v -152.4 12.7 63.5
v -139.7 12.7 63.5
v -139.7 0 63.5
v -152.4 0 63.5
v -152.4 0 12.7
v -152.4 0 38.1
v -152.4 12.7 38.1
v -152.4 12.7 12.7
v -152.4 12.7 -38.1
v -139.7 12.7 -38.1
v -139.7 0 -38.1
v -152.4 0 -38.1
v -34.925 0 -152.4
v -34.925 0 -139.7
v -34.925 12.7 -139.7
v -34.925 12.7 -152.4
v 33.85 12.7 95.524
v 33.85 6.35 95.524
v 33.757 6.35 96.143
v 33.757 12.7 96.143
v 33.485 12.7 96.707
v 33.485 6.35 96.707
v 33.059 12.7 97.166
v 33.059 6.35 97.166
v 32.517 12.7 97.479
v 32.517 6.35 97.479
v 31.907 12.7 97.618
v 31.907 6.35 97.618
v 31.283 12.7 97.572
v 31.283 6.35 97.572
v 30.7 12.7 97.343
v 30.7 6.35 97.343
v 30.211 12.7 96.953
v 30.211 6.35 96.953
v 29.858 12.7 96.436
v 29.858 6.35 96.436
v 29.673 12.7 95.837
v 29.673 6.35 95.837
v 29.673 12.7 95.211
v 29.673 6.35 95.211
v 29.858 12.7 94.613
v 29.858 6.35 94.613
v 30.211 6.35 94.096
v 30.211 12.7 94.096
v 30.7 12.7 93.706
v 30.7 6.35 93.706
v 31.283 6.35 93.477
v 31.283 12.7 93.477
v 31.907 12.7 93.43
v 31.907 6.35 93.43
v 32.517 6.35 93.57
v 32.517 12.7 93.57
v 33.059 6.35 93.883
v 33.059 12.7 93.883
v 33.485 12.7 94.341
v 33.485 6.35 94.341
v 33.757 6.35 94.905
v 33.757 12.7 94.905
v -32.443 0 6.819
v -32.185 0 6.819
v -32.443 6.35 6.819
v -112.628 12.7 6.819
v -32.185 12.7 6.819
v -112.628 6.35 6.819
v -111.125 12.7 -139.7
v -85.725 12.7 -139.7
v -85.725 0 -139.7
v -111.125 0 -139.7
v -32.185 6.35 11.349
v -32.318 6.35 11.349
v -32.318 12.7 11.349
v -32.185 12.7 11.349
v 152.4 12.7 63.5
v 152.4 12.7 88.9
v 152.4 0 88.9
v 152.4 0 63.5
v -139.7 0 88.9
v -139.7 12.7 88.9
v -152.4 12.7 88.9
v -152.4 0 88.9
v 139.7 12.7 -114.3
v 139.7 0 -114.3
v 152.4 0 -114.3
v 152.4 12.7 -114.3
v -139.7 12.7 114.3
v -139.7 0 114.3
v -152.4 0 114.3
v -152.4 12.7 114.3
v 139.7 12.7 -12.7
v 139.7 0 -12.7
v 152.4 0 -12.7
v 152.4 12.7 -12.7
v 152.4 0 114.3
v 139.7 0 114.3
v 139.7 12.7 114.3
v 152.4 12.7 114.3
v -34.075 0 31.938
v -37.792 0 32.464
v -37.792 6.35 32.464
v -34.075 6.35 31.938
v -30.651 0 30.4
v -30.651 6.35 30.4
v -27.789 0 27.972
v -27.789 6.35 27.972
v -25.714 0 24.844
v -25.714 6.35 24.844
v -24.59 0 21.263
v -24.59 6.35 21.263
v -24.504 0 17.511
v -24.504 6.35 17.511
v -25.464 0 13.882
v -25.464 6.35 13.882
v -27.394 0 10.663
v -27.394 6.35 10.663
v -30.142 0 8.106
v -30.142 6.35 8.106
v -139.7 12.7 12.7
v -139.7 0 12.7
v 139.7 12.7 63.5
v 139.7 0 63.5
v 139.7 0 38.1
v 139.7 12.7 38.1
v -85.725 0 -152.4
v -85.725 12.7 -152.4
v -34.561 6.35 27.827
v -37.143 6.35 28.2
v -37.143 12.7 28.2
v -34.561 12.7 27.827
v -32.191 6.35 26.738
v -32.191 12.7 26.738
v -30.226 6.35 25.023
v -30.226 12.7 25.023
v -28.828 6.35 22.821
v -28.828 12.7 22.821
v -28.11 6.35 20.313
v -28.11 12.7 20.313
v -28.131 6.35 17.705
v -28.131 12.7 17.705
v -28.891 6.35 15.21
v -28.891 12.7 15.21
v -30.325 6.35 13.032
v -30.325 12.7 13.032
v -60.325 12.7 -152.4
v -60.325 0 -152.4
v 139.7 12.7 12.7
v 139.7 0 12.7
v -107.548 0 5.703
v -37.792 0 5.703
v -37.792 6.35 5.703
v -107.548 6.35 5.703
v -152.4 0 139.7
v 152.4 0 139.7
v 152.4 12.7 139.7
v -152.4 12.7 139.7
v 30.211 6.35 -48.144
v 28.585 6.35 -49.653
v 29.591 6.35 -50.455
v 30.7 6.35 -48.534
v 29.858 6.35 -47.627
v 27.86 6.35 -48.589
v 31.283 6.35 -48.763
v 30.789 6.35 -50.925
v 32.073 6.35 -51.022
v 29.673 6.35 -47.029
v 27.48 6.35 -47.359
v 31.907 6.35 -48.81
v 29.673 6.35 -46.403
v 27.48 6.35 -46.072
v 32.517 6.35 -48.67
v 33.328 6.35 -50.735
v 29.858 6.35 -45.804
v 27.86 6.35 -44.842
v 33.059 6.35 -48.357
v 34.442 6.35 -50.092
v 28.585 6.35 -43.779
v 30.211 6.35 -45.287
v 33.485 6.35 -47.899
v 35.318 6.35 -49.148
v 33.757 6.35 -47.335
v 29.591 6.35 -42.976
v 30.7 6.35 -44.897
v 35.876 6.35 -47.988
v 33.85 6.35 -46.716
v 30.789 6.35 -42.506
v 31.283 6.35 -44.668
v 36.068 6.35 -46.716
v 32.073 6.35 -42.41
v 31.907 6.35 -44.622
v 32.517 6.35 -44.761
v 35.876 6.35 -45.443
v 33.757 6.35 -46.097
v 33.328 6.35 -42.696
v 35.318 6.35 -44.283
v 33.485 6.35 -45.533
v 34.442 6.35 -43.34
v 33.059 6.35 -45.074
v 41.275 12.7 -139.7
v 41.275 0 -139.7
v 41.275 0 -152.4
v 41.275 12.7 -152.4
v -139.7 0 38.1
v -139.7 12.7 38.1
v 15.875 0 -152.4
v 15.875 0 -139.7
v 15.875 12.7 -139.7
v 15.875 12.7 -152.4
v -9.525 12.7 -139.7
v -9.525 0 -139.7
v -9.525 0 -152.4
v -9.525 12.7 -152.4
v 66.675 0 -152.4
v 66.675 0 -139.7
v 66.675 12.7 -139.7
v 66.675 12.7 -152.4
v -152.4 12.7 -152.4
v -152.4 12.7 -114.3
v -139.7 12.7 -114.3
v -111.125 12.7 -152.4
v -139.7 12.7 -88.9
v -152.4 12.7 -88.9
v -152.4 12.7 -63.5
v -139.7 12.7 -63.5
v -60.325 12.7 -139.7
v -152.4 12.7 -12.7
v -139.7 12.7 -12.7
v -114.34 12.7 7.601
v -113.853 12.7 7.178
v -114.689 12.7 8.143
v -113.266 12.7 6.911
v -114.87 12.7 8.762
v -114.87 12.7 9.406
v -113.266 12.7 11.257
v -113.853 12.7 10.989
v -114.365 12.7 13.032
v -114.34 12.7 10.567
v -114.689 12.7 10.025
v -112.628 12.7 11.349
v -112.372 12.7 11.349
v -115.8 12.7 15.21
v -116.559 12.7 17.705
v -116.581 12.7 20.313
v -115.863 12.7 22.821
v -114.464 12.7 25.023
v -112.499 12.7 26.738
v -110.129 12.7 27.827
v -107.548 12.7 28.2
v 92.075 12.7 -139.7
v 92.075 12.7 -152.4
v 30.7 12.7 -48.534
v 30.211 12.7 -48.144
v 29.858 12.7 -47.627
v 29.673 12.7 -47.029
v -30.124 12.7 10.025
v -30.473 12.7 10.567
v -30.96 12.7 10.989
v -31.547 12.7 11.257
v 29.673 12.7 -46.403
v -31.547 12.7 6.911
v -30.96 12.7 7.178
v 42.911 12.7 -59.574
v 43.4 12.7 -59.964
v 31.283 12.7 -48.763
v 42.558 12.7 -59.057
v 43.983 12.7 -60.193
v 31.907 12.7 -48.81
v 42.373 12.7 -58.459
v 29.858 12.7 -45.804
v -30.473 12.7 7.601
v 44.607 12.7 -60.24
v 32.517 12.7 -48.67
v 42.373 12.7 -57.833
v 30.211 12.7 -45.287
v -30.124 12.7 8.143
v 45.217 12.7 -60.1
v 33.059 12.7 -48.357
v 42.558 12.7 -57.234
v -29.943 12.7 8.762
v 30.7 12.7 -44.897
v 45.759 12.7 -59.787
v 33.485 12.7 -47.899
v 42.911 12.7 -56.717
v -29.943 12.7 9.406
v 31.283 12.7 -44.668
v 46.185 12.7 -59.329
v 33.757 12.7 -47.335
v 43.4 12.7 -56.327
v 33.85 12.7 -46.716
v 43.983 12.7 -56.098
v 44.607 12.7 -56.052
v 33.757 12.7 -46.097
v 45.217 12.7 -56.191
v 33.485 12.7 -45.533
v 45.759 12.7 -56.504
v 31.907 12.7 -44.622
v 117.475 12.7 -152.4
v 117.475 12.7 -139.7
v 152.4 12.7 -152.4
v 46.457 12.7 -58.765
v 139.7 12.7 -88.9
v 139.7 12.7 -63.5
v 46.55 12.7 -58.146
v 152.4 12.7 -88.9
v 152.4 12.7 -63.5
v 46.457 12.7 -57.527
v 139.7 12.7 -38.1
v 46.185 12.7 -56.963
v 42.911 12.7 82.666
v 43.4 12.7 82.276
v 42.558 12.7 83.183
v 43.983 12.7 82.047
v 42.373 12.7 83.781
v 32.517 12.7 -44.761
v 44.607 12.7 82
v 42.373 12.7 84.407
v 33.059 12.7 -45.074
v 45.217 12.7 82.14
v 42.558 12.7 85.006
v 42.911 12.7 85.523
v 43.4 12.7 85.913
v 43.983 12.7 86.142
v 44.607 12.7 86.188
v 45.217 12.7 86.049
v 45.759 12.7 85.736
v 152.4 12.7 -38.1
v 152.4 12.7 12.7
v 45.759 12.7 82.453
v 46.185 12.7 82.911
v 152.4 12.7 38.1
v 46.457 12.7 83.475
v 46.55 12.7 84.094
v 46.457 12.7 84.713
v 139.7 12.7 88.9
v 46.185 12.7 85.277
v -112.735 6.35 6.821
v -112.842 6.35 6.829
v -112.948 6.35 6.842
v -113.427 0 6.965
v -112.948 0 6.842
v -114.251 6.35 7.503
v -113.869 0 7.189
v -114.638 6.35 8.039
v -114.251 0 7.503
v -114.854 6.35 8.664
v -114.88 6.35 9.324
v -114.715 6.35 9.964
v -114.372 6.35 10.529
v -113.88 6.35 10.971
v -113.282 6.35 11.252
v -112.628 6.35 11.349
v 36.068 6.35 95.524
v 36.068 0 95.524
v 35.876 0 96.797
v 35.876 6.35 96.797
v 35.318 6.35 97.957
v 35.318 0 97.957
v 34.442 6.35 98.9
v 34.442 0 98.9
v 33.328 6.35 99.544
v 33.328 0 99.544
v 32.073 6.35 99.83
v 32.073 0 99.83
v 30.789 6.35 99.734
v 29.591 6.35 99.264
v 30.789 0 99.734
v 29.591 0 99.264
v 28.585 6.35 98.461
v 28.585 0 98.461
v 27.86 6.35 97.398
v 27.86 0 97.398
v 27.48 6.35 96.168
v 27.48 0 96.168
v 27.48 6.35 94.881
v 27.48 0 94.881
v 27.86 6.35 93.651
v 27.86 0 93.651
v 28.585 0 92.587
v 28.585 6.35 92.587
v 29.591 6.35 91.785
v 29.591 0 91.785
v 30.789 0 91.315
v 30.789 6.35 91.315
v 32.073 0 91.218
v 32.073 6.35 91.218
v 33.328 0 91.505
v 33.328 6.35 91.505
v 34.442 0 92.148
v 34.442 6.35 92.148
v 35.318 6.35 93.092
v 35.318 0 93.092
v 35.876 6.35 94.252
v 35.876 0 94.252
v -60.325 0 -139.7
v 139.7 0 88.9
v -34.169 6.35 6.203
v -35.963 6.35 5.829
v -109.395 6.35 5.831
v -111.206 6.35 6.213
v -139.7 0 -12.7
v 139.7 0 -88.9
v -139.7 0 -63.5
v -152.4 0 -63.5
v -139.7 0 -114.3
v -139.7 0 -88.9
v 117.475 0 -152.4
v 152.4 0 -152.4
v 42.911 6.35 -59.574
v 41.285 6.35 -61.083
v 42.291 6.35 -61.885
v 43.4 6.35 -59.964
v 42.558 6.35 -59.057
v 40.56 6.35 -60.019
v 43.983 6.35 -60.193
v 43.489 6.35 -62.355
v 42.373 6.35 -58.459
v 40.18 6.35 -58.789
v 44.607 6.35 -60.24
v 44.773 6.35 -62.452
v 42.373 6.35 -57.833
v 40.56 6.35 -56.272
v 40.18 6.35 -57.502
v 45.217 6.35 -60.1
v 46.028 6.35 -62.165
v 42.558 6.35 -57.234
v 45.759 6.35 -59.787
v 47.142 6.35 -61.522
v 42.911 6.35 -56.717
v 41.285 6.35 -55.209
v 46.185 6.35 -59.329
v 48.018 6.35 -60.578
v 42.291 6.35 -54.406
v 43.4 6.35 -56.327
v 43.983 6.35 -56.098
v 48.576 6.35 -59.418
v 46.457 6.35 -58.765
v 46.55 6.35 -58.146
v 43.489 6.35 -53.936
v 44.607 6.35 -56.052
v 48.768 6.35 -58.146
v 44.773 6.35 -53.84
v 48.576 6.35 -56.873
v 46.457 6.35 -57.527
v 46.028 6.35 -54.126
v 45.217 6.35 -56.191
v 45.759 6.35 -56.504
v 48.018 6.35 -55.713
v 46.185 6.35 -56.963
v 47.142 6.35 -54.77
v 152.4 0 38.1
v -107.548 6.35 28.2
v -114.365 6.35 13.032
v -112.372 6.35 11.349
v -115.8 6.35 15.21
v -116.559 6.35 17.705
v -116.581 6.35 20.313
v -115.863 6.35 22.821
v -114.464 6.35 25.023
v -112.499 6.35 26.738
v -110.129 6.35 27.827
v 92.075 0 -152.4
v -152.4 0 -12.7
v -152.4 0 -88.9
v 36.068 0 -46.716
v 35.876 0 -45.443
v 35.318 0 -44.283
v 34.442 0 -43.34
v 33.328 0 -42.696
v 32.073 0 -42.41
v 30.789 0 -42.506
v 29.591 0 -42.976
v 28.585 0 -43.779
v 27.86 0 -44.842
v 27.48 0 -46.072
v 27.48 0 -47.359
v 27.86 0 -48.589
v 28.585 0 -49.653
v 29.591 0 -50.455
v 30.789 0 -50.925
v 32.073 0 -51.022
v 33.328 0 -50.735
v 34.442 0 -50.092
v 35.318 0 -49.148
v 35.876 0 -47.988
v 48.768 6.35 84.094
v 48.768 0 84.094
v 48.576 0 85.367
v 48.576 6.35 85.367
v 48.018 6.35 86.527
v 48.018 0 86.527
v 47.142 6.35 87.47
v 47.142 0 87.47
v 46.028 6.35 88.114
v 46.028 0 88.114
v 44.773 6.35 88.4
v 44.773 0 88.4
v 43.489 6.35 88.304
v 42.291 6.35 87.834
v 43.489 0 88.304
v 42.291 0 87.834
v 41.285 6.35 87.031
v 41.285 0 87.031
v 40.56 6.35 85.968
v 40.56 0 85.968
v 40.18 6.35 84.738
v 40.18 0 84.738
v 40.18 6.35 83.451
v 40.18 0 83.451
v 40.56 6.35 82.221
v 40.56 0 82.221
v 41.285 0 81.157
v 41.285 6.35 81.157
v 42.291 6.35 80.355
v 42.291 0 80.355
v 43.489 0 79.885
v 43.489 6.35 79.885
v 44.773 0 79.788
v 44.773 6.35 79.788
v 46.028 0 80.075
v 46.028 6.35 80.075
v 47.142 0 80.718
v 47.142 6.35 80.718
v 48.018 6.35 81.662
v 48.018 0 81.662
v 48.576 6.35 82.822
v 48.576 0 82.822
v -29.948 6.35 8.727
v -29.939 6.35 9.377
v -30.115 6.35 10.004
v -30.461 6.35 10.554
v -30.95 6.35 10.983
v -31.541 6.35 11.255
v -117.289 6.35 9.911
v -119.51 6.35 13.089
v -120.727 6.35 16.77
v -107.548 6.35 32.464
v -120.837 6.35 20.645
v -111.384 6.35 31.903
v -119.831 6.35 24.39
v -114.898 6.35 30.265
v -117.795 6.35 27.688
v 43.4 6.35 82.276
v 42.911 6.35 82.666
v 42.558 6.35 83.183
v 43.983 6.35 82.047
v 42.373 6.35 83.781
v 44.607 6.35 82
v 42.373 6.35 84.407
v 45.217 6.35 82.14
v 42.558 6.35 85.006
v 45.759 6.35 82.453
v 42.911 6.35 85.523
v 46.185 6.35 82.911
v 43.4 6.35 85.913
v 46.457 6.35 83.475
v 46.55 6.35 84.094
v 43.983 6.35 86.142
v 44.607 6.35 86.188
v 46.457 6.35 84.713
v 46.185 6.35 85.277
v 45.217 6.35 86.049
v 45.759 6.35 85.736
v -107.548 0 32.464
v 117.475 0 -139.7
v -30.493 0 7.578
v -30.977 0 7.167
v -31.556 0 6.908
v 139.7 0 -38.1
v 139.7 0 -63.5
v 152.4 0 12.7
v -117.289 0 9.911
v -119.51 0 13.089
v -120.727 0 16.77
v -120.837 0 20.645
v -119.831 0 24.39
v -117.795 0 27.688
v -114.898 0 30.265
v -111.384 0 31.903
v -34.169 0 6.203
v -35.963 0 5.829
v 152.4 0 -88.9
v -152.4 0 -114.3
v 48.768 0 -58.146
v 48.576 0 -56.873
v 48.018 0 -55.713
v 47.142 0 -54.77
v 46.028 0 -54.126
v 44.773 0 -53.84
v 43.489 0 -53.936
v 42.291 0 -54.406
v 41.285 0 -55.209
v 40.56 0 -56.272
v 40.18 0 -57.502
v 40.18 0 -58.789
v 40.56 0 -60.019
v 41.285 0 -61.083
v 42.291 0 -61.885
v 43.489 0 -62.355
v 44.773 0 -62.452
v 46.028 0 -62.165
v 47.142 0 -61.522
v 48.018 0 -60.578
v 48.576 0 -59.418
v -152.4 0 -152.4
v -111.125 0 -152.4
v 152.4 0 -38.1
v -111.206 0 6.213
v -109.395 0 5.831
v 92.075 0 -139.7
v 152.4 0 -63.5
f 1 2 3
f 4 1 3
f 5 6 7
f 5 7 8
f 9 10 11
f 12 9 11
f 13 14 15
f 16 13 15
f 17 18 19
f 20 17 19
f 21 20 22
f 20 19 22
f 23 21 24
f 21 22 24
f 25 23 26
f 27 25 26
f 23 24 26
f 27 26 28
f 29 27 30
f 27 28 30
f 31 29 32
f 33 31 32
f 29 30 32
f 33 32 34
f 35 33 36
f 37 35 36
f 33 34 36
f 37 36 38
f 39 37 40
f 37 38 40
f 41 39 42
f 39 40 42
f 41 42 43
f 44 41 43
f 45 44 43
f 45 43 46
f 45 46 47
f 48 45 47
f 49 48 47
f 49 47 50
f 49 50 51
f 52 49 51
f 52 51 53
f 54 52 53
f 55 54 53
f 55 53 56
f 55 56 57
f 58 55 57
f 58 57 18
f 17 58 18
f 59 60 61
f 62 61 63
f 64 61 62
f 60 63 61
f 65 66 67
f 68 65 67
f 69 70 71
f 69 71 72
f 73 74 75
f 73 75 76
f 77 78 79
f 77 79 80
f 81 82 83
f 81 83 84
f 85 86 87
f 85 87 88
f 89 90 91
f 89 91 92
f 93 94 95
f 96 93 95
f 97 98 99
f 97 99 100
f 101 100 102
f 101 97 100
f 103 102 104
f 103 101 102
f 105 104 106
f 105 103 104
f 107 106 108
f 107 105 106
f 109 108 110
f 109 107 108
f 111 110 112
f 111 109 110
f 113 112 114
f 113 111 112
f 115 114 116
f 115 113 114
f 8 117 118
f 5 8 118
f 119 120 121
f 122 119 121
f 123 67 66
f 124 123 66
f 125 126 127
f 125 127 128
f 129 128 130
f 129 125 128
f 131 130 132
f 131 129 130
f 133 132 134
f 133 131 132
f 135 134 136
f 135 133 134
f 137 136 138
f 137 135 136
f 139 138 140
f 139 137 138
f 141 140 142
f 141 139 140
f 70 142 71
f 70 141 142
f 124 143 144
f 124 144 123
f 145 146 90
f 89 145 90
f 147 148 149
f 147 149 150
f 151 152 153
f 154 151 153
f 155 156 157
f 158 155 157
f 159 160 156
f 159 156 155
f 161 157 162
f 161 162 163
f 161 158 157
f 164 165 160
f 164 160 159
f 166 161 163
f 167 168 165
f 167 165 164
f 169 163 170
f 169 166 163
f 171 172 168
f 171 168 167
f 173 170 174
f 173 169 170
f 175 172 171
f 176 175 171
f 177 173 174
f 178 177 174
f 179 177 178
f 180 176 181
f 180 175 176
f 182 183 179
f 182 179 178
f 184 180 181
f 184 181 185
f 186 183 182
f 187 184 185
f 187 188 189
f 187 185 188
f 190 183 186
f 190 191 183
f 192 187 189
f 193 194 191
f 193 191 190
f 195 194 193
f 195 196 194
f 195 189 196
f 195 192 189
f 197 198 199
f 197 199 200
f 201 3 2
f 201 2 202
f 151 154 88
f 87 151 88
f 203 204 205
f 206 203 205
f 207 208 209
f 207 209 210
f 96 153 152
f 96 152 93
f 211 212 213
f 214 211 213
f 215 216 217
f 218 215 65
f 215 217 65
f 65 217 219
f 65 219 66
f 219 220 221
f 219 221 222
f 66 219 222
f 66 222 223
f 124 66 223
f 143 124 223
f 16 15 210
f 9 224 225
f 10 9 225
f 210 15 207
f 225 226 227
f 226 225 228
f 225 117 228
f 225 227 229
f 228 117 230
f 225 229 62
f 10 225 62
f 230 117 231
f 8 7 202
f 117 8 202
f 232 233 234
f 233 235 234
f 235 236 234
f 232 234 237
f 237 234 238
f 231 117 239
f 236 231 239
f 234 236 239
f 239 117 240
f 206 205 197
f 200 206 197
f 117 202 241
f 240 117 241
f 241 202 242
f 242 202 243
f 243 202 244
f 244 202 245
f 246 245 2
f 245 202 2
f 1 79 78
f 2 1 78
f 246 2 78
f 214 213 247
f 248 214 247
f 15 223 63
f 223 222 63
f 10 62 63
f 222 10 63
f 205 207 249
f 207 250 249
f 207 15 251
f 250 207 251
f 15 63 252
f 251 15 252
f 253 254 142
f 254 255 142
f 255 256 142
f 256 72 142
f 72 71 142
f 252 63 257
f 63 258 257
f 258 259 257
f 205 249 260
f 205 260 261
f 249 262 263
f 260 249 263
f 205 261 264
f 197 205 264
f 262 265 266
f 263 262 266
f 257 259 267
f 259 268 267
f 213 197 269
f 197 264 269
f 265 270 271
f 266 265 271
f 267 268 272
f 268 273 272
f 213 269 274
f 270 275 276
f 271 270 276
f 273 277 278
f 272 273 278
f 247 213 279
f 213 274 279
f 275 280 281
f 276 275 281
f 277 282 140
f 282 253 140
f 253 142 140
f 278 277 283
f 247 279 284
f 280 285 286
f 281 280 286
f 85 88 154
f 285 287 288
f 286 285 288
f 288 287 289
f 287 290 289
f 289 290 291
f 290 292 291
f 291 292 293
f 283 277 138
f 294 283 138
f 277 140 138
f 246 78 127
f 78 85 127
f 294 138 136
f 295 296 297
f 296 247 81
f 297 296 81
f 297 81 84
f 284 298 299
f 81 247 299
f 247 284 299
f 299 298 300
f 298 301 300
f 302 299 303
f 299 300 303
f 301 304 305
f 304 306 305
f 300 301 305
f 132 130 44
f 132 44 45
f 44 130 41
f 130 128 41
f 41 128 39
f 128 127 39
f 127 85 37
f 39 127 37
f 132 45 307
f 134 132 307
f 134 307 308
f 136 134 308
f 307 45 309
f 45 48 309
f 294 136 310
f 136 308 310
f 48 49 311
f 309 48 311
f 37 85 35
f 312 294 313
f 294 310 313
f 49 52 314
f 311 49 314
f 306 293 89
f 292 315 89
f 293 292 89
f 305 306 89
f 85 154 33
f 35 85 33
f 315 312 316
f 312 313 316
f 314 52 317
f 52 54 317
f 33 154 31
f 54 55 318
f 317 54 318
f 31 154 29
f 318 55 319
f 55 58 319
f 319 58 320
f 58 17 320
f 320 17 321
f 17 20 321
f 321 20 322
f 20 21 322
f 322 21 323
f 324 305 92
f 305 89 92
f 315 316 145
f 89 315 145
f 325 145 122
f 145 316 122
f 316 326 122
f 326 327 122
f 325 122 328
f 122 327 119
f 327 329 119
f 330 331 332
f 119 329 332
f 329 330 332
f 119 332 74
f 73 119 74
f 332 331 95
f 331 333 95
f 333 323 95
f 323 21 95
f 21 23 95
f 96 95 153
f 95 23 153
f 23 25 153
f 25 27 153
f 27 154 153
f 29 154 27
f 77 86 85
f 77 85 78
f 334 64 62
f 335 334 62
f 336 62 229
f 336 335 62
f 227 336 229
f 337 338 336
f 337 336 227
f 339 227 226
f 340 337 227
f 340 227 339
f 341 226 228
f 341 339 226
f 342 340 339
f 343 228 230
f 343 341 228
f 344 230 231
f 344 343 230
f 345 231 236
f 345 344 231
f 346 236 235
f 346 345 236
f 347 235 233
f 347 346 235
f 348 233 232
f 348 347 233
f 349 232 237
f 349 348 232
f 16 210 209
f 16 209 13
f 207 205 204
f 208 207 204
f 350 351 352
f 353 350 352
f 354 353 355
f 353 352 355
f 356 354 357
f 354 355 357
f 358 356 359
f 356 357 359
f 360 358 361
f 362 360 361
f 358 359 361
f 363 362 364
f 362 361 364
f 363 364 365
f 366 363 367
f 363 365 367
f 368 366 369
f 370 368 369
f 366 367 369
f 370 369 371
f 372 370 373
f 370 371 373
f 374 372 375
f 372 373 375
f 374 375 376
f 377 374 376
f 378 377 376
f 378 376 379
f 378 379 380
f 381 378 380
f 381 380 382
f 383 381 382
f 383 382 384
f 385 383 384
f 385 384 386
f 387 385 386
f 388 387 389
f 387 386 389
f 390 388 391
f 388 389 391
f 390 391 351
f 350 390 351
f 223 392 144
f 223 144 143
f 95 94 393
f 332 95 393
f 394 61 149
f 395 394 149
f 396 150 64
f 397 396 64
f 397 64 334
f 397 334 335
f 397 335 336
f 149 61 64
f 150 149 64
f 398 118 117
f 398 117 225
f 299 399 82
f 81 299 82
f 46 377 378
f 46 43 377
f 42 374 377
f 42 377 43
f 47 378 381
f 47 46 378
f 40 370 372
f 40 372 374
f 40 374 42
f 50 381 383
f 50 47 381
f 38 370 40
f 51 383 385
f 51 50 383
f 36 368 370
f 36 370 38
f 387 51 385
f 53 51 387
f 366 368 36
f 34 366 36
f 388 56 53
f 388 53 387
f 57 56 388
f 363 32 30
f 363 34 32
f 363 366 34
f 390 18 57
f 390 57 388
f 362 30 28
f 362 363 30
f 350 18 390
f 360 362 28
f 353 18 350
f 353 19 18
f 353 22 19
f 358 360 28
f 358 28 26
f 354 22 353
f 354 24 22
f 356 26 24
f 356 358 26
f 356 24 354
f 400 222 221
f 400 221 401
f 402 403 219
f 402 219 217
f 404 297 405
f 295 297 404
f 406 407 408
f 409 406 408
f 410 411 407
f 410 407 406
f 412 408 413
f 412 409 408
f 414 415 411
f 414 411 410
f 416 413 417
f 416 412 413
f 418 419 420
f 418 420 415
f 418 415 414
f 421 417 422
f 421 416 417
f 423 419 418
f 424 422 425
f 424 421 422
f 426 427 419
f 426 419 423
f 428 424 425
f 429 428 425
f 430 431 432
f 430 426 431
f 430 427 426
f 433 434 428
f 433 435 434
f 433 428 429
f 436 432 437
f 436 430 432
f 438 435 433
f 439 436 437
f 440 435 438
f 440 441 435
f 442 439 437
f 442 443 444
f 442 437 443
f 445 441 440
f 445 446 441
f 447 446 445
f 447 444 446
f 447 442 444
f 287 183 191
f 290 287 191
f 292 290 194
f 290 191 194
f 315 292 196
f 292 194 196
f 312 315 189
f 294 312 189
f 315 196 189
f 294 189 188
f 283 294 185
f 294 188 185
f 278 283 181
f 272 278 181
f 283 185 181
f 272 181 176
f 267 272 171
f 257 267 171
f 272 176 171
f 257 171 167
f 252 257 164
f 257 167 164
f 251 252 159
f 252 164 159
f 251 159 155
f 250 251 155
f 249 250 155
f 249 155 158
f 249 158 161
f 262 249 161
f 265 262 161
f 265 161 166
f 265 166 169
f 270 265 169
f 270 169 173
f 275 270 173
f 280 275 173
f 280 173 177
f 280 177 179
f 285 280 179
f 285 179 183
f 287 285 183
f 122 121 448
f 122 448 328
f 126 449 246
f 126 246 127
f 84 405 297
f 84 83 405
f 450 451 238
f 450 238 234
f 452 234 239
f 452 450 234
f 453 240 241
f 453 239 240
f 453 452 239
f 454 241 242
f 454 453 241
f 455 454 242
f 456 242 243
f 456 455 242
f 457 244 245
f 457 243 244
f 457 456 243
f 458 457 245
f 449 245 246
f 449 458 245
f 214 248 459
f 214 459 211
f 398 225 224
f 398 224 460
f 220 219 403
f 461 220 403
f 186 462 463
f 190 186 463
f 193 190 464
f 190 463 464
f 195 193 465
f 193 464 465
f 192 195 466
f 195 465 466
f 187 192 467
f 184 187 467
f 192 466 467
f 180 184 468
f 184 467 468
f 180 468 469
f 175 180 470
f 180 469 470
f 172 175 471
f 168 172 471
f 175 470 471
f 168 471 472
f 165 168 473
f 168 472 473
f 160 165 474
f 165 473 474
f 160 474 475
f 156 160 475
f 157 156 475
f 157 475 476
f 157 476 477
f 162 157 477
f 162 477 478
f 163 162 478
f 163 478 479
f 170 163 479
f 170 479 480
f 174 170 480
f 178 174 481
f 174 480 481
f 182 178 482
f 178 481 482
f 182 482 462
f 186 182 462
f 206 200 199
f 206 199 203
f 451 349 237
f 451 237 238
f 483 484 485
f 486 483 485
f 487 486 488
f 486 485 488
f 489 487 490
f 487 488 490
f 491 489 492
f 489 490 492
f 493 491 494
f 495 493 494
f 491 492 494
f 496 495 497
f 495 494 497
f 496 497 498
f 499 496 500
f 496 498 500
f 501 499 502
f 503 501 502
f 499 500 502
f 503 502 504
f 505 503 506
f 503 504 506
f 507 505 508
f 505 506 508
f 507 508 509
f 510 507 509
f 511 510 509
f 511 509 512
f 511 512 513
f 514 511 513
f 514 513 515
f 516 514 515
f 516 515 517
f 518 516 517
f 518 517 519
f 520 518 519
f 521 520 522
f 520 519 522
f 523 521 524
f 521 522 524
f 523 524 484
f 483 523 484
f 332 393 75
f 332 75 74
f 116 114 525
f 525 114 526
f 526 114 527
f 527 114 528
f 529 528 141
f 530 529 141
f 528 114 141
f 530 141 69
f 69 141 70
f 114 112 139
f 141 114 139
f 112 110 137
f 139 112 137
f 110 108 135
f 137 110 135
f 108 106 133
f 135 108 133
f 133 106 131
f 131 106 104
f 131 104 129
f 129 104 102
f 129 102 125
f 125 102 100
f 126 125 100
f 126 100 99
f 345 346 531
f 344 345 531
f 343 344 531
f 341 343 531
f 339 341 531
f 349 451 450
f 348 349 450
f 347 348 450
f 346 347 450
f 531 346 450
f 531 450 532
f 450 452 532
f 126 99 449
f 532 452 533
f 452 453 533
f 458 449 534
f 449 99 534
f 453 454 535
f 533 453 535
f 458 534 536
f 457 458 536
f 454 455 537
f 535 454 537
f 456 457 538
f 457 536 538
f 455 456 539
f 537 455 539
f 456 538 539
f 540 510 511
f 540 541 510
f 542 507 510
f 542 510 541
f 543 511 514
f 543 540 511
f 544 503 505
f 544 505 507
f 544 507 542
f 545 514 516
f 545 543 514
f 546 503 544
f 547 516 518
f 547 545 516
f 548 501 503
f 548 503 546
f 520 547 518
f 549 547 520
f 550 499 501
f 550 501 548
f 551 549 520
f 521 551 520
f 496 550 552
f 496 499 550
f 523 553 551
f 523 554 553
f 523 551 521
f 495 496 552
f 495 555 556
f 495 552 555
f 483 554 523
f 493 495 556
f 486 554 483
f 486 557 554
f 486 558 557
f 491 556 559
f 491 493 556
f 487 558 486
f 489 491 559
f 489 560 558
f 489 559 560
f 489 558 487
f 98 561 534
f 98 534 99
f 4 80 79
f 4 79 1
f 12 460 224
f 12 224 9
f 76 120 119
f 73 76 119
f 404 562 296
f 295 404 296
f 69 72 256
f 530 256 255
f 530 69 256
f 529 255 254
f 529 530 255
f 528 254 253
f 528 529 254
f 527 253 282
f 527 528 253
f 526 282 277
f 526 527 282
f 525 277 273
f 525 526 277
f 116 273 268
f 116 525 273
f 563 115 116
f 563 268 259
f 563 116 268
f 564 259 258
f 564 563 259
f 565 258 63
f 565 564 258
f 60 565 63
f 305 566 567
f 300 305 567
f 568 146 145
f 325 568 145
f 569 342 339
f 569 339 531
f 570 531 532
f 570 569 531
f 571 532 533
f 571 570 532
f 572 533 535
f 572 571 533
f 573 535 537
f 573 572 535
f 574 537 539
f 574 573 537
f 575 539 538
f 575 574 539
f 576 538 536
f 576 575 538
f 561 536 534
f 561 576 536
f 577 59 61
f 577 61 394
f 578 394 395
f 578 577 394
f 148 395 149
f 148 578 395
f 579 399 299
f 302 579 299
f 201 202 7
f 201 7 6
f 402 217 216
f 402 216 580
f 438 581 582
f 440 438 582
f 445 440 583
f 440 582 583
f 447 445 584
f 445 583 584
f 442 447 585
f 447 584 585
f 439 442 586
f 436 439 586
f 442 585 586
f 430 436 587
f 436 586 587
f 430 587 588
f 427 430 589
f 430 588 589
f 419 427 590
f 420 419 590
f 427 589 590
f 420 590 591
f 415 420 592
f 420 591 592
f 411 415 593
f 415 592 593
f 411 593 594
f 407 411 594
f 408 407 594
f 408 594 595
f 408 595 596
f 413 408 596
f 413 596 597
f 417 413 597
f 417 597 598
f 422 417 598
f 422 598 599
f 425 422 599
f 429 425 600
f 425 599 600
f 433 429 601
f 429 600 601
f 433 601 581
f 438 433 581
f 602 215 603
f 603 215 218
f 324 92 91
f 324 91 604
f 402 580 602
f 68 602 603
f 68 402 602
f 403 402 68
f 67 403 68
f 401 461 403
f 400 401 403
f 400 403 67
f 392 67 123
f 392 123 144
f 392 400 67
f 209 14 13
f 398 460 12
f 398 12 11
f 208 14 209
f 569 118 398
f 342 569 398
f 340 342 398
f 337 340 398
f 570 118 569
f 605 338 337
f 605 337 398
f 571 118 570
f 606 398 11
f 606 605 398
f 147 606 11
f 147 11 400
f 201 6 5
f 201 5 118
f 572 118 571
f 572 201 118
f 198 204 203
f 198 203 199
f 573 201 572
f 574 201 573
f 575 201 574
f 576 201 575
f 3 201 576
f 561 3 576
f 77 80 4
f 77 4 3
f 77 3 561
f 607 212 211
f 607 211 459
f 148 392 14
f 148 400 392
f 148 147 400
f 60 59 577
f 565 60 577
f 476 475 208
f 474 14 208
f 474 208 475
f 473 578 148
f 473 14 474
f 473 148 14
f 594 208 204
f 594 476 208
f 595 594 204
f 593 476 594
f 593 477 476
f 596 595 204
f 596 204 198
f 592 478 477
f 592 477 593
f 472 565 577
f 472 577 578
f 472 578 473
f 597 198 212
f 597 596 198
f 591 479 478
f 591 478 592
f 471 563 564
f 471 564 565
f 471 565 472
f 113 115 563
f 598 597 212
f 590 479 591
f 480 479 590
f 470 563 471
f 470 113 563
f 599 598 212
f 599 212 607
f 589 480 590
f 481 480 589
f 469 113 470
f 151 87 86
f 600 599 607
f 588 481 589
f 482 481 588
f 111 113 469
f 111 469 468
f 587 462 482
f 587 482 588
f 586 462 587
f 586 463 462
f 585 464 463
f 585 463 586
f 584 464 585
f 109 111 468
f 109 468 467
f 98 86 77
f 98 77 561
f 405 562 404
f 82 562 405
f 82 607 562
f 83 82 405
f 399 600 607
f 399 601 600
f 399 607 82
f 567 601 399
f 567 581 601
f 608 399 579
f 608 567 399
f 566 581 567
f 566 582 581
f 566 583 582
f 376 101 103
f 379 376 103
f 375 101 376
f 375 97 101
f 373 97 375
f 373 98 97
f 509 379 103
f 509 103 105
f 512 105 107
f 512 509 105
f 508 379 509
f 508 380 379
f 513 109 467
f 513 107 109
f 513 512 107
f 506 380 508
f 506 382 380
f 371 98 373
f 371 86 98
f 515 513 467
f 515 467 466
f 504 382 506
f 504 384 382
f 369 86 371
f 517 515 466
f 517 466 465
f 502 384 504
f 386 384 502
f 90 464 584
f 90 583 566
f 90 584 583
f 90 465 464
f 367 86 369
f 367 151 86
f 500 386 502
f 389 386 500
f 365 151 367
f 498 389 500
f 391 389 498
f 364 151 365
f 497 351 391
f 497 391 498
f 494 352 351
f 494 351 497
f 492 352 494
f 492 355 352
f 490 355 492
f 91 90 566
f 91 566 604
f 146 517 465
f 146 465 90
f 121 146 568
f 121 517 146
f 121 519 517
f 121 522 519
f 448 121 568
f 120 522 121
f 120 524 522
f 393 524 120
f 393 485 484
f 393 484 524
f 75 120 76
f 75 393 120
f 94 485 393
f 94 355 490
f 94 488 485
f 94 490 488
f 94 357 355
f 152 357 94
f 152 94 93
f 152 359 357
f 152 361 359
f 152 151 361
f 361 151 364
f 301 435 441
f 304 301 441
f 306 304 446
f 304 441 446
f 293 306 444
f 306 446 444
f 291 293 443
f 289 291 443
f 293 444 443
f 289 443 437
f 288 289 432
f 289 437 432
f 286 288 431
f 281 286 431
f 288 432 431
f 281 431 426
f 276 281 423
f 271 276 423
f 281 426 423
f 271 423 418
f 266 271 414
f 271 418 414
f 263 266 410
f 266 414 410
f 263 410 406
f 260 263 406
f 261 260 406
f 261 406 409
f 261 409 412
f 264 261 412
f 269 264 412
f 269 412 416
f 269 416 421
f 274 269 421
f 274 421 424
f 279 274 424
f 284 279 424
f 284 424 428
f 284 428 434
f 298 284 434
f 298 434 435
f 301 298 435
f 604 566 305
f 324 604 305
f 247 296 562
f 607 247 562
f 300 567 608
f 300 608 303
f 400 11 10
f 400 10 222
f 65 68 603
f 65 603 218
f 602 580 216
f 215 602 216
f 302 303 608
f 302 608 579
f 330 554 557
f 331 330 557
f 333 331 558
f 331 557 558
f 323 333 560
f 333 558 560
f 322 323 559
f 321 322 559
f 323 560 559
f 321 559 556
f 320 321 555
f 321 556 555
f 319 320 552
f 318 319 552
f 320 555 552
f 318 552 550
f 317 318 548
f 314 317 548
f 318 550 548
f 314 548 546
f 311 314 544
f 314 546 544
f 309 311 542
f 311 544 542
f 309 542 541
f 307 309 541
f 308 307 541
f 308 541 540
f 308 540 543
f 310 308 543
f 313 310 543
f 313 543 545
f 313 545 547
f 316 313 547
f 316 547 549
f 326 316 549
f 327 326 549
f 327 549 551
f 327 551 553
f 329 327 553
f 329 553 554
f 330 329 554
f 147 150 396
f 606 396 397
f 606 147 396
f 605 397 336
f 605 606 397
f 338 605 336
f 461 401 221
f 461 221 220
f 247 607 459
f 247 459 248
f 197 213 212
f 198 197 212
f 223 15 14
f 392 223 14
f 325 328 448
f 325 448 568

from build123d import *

# Parameters (mm, degrees)
SKETCH1_W               = 279.4
SKETCH1_H               = 279.4
BOSS_EXTRUDE1_DEPTH     = 12.7
SKETCH2_W               = 25.4
SKETCH2_H               = 12.7
BOSS_EXTRUDE2_DEPTH     = 12.7
LPATTERN1_COUNT         = 6
LPATTERN1_PITCH         = 50.8
MIRROR1_COPY_1_SKETCH_W = 25.4
MIRROR1_COPY_1_SKETCH_H = 12.7
MIRROR1_COPY_1_DEPTH    = 12.7
MIRROR1_COPY_2_SKETCH_W = 25.4
MIRROR1_COPY_2_SKETCH_H = 12.7
MIRROR1_COPY_2_DEPTH    = 12.7
MIRROR1_COPY_3_SKETCH_W = 25.4
MIRROR1_COPY_3_SKETCH_H = 12.7
MIRROR1_COPY_3_DEPTH    = 12.7
MIRROR1_COPY_4_SKETCH_W = 25.4
MIRROR1_COPY_4_SKETCH_H = 12.7
MIRROR1_COPY_4_DEPTH    = 12.7
MIRROR1_COPY_5_SKETCH_W = 25.4
MIRROR1_COPY_5_SKETCH_H = 12.7
MIRROR1_COPY_5_DEPTH    = 12.7
MIRROR1_COPY_6_SKETCH_W = 25.4
MIRROR1_COPY_6_SKETCH_H = 12.7
MIRROR1_COPY_6_DEPTH    = 12.7
SKETCH3_W               = 25.4
SKETCH3_H               = 12.7
BOSS_EXTRUDE3_DEPTH     = 12.7
LPATTERN2_COUNT         = 6
LPATTERN2_PITCH         = 50.8
SKETCH5_W               = 25.4
SKETCH5_H               = 12.7
BOSS_EXTRUDE4_DEPTH     = 12.7
SKETCH6_R               = 2.1
CUT_EXTRUDE1_DEPTH      = 216.9
SKETCH7_R               = 4.318
CUT_EXTRUDE2_DEPTH      = 6.35
SKETCH8_R               = 2.2225
CUT_EXTRUDE3_DEPTH      = 216.9
CUT_EXTRUDE5_DEPTH      = 216.9
CUT_EXTRUDE6_DEPTH      = 6.35


with BuildPart() as part:
    # Sketch1 → Boss-Extrude1 (new body)
    with BuildSketch(Plane(origin=(0, 0, 0), x_dir=(1, 0, 0), z_dir=(0, 1, 0))):
        Rectangle(SKETCH1_W, SKETCH1_H)
    extrude(amount=BOSS_EXTRUDE1_DEPTH)

    # Sketch2 → Boss-Extrude2 (add)
    with BuildSketch(Plane(origin=(139.7, 0, 0), x_dir=(0, 0, -1), z_dir=(1, 0, 0))):
        with Locations((-127, 6.35)):
            Rectangle(SKETCH2_W, SKETCH2_H)
    boss_extrude2 = extrude(amount=BOSS_EXTRUDE2_DEPTH)

    # LPattern1: Boss-Extrude2 ×6
    with Locations(*[(0, 0, -i * LPATTERN1_PITCH) for i in range(1, LPATTERN1_COUNT)]):
        add(boss_extrude2)

    # Mirror1 copy 1 sketch → Mirror1 copy 1 (add)
    with BuildSketch(Plane(origin=(-139.7, 0, -50.8), x_dir=(0, 0, -1), z_dir=(-1, 0, 0))):
        with Locations((-127, -6.35)):
            Rectangle(MIRROR1_COPY_1_SKETCH_W, MIRROR1_COPY_1_SKETCH_H)
    extrude(amount=MIRROR1_COPY_1_DEPTH)

    # Mirror1 copy 2 sketch → Mirror1 copy 2 (add)
    with BuildSketch(Plane(origin=(-139.7, 0, -101.6), x_dir=(0, 0, -1), z_dir=(-1, 0, 0))):
        with Locations((-127, -6.35)):
            Rectangle(MIRROR1_COPY_2_SKETCH_W, MIRROR1_COPY_2_SKETCH_H)
    extrude(amount=MIRROR1_COPY_2_DEPTH)

    # Mirror1 copy 3 sketch → Mirror1 copy 3 (add)
    with BuildSketch(Plane(origin=(-139.7, 0, -152.4), x_dir=(0, 0, -1), z_dir=(-1, 0, 0))):
        with Locations((-127, -6.35)):
            Rectangle(MIRROR1_COPY_3_SKETCH_W, MIRROR1_COPY_3_SKETCH_H)
    extrude(amount=MIRROR1_COPY_3_DEPTH)

    # Mirror1 copy 4 sketch → Mirror1 copy 4 (add)
    with BuildSketch(Plane(origin=(-139.7, 0, -203.2), x_dir=(0, 0, -1), z_dir=(-1, 0, 0))):
        with Locations((-127, -6.35)):
            Rectangle(MIRROR1_COPY_4_SKETCH_W, MIRROR1_COPY_4_SKETCH_H)
    extrude(amount=MIRROR1_COPY_4_DEPTH)

    # Mirror1 copy 5 sketch → Mirror1 copy 5 (add)
    with BuildSketch(Plane(origin=(-139.7, 0, -254), x_dir=(0, 0, -1), z_dir=(-1, 0, 0))):
        with Locations((-127, -6.35)):
            Rectangle(MIRROR1_COPY_5_SKETCH_W, MIRROR1_COPY_5_SKETCH_H)
    extrude(amount=MIRROR1_COPY_5_DEPTH)

    # Mirror1 copy 6 sketch → Mirror1 copy 6 (add)
    with BuildSketch(Plane(origin=(-139.7, 0, 0), x_dir=(0, 0, -1), z_dir=(-1, 0, 0))):
        with Locations((-127, -6.35)):
            Rectangle(MIRROR1_COPY_6_SKETCH_W, MIRROR1_COPY_6_SKETCH_H)
    extrude(amount=MIRROR1_COPY_6_DEPTH)

    # Sketch3 → Boss-Extrude3 (add)
    with BuildSketch(Plane(origin=(0, 0, -139.7), x_dir=(-1, 0, 0), z_dir=(0, 0, -1))):
        with Locations((-130.175, 6.35)):
            Rectangle(SKETCH3_W, SKETCH3_H)
    boss_extrude3 = extrude(amount=BOSS_EXTRUDE3_DEPTH)

    # LPattern2: Boss-Extrude3 ×6
    with Locations(*[(-i * LPATTERN2_PITCH, 0, 0) for i in range(1, LPATTERN2_COUNT)]):
        add(boss_extrude3)

    # Sketch5 → Boss-Extrude4 (add)
    with BuildSketch(Plane(origin=(0, 0, -139.7), x_dir=(-1, 0, 0), z_dir=(0, 0, -1))):
        with Locations((-139.7, 6.35)):
            Rectangle(SKETCH5_W, SKETCH5_H)
    boss_extrude4 = extrude(amount=BOSS_EXTRUDE4_DEPTH)

    # Mirror2: Boss-Extrude4 across plane
    add(boss_extrude4.mirror(Plane(origin=(0, 0, 0), x_dir=(0, 0, 1), z_dir=(1, 0, 0))))

    # Sketch6 → Cut-Extrude1 (cut, through all)
    with BuildSketch(Plane.XZ):
        with Locations((44.45, -58.145648771)):
            Circle(SKETCH6_R)
        with Locations((31.75, -46.715648771)):
            Circle(SKETCH6_R)
        with Locations((31.75, 95.524351229)):
            Circle(SKETCH6_R)
        with Locations((44.45, 84.094351229)):
            Circle(SKETCH6_R)
    extrude(amount=-CUT_EXTRUDE1_DEPTH, mode=Mode.SUBTRACT)

    # Sketch7 → Cut-Extrude2 (cut)
    with BuildSketch(Plane.XZ):
        with Locations((31.75, 95.524351229)):
            Circle(SKETCH7_R)
        with Locations((44.45, 84.094351229)):
            Circle(SKETCH7_R)
        with Locations((31.75, -46.715648771)):
            Circle(SKETCH7_R)
        with Locations((44.45, -58.145648771)):
            Circle(SKETCH7_R)
    extrude(amount=-CUT_EXTRUDE2_DEPTH, mode=Mode.SUBTRACT)

    # Sketch8 → Cut-Extrude3 (cut, through all)
    with BuildSketch(Plane(origin=(0, 12.7, 0), x_dir=(1, 0, 0), z_dir=(0, 1, 0))):
        with Locations((-49.920301731, -19.083881859)):
            Circle(SKETCH8_R)
        with Locations((-44.920301731, -9.083881859)):
            Circle(SKETCH8_R)
        with Locations((-94.920301731, -19.083881859)):
            Circle(SKETCH8_R)
        with Locations((-99.920301731, -9.083881859)):
            Circle(SKETCH8_R)
    extrude(amount=-CUT_EXTRUDE3_DEPTH, mode=Mode.SUBTRACT)

    # Sketch10 → Cut-Extrude5 (cut, through all)
    with BuildSketch(Plane.XZ):
        with BuildLine():
            Line((-112.628282809, 11.348870188), (-32.184656299, 11.348870188))
            ThreePointArc((-32.184656299, 11.348870188), (-29.919667971, 9.083881859), (-32.184656299, 6.81889353))
            Line((-32.184656299, 6.81889353), (-112.628282809, 6.81889353))
            ThreePointArc((-112.628282809, 6.81889353), (-114.893271138, 9.083881859), (-112.628282809, 11.348870188))
        make_face()
        with BuildLine():
            Line((-107.547672787, 28.200110176), (-37.142684893, 28.200110176))
            ThreePointArc((-37.142684893, 28.200110176), (-28.026456576, 19.083881859), (-37.142684893, 9.967653542))
            Line((-37.142684893, 9.967653542), (-107.547672787, 9.967653542))
            ThreePointArc((-107.547672787, 9.967653542), (-116.663901104, 19.083881859), (-107.547672787, 28.200110176))
        make_face()
    extrude(amount=-CUT_EXTRUDE5_DEPTH, mode=Mode.SUBTRACT)

    # Sketch12 → Cut-Extrude6 (cut)
    with BuildSketch(Plane.XZ):
        with BuildLine():
            Line((-107.547672787, 32.464365023), (-37.791668277, 32.464365023))
            ThreePointArc((-37.791668277, 32.464365023), (-24.411185114, 19.083881859), (-37.791668277, 5.703398696))
            Line((-37.791668277, 5.703398696), (-107.547672787, 5.703398696))
            ThreePointArc((-107.547672787, 5.703398696), (-120.92815595, 19.083881859), (-107.547672787, 32.464365023))
        make_face()
    extrude(amount=-CUT_EXTRUDE6_DEPTH, mode=Mode.SUBTRACT)


solid = part.part
